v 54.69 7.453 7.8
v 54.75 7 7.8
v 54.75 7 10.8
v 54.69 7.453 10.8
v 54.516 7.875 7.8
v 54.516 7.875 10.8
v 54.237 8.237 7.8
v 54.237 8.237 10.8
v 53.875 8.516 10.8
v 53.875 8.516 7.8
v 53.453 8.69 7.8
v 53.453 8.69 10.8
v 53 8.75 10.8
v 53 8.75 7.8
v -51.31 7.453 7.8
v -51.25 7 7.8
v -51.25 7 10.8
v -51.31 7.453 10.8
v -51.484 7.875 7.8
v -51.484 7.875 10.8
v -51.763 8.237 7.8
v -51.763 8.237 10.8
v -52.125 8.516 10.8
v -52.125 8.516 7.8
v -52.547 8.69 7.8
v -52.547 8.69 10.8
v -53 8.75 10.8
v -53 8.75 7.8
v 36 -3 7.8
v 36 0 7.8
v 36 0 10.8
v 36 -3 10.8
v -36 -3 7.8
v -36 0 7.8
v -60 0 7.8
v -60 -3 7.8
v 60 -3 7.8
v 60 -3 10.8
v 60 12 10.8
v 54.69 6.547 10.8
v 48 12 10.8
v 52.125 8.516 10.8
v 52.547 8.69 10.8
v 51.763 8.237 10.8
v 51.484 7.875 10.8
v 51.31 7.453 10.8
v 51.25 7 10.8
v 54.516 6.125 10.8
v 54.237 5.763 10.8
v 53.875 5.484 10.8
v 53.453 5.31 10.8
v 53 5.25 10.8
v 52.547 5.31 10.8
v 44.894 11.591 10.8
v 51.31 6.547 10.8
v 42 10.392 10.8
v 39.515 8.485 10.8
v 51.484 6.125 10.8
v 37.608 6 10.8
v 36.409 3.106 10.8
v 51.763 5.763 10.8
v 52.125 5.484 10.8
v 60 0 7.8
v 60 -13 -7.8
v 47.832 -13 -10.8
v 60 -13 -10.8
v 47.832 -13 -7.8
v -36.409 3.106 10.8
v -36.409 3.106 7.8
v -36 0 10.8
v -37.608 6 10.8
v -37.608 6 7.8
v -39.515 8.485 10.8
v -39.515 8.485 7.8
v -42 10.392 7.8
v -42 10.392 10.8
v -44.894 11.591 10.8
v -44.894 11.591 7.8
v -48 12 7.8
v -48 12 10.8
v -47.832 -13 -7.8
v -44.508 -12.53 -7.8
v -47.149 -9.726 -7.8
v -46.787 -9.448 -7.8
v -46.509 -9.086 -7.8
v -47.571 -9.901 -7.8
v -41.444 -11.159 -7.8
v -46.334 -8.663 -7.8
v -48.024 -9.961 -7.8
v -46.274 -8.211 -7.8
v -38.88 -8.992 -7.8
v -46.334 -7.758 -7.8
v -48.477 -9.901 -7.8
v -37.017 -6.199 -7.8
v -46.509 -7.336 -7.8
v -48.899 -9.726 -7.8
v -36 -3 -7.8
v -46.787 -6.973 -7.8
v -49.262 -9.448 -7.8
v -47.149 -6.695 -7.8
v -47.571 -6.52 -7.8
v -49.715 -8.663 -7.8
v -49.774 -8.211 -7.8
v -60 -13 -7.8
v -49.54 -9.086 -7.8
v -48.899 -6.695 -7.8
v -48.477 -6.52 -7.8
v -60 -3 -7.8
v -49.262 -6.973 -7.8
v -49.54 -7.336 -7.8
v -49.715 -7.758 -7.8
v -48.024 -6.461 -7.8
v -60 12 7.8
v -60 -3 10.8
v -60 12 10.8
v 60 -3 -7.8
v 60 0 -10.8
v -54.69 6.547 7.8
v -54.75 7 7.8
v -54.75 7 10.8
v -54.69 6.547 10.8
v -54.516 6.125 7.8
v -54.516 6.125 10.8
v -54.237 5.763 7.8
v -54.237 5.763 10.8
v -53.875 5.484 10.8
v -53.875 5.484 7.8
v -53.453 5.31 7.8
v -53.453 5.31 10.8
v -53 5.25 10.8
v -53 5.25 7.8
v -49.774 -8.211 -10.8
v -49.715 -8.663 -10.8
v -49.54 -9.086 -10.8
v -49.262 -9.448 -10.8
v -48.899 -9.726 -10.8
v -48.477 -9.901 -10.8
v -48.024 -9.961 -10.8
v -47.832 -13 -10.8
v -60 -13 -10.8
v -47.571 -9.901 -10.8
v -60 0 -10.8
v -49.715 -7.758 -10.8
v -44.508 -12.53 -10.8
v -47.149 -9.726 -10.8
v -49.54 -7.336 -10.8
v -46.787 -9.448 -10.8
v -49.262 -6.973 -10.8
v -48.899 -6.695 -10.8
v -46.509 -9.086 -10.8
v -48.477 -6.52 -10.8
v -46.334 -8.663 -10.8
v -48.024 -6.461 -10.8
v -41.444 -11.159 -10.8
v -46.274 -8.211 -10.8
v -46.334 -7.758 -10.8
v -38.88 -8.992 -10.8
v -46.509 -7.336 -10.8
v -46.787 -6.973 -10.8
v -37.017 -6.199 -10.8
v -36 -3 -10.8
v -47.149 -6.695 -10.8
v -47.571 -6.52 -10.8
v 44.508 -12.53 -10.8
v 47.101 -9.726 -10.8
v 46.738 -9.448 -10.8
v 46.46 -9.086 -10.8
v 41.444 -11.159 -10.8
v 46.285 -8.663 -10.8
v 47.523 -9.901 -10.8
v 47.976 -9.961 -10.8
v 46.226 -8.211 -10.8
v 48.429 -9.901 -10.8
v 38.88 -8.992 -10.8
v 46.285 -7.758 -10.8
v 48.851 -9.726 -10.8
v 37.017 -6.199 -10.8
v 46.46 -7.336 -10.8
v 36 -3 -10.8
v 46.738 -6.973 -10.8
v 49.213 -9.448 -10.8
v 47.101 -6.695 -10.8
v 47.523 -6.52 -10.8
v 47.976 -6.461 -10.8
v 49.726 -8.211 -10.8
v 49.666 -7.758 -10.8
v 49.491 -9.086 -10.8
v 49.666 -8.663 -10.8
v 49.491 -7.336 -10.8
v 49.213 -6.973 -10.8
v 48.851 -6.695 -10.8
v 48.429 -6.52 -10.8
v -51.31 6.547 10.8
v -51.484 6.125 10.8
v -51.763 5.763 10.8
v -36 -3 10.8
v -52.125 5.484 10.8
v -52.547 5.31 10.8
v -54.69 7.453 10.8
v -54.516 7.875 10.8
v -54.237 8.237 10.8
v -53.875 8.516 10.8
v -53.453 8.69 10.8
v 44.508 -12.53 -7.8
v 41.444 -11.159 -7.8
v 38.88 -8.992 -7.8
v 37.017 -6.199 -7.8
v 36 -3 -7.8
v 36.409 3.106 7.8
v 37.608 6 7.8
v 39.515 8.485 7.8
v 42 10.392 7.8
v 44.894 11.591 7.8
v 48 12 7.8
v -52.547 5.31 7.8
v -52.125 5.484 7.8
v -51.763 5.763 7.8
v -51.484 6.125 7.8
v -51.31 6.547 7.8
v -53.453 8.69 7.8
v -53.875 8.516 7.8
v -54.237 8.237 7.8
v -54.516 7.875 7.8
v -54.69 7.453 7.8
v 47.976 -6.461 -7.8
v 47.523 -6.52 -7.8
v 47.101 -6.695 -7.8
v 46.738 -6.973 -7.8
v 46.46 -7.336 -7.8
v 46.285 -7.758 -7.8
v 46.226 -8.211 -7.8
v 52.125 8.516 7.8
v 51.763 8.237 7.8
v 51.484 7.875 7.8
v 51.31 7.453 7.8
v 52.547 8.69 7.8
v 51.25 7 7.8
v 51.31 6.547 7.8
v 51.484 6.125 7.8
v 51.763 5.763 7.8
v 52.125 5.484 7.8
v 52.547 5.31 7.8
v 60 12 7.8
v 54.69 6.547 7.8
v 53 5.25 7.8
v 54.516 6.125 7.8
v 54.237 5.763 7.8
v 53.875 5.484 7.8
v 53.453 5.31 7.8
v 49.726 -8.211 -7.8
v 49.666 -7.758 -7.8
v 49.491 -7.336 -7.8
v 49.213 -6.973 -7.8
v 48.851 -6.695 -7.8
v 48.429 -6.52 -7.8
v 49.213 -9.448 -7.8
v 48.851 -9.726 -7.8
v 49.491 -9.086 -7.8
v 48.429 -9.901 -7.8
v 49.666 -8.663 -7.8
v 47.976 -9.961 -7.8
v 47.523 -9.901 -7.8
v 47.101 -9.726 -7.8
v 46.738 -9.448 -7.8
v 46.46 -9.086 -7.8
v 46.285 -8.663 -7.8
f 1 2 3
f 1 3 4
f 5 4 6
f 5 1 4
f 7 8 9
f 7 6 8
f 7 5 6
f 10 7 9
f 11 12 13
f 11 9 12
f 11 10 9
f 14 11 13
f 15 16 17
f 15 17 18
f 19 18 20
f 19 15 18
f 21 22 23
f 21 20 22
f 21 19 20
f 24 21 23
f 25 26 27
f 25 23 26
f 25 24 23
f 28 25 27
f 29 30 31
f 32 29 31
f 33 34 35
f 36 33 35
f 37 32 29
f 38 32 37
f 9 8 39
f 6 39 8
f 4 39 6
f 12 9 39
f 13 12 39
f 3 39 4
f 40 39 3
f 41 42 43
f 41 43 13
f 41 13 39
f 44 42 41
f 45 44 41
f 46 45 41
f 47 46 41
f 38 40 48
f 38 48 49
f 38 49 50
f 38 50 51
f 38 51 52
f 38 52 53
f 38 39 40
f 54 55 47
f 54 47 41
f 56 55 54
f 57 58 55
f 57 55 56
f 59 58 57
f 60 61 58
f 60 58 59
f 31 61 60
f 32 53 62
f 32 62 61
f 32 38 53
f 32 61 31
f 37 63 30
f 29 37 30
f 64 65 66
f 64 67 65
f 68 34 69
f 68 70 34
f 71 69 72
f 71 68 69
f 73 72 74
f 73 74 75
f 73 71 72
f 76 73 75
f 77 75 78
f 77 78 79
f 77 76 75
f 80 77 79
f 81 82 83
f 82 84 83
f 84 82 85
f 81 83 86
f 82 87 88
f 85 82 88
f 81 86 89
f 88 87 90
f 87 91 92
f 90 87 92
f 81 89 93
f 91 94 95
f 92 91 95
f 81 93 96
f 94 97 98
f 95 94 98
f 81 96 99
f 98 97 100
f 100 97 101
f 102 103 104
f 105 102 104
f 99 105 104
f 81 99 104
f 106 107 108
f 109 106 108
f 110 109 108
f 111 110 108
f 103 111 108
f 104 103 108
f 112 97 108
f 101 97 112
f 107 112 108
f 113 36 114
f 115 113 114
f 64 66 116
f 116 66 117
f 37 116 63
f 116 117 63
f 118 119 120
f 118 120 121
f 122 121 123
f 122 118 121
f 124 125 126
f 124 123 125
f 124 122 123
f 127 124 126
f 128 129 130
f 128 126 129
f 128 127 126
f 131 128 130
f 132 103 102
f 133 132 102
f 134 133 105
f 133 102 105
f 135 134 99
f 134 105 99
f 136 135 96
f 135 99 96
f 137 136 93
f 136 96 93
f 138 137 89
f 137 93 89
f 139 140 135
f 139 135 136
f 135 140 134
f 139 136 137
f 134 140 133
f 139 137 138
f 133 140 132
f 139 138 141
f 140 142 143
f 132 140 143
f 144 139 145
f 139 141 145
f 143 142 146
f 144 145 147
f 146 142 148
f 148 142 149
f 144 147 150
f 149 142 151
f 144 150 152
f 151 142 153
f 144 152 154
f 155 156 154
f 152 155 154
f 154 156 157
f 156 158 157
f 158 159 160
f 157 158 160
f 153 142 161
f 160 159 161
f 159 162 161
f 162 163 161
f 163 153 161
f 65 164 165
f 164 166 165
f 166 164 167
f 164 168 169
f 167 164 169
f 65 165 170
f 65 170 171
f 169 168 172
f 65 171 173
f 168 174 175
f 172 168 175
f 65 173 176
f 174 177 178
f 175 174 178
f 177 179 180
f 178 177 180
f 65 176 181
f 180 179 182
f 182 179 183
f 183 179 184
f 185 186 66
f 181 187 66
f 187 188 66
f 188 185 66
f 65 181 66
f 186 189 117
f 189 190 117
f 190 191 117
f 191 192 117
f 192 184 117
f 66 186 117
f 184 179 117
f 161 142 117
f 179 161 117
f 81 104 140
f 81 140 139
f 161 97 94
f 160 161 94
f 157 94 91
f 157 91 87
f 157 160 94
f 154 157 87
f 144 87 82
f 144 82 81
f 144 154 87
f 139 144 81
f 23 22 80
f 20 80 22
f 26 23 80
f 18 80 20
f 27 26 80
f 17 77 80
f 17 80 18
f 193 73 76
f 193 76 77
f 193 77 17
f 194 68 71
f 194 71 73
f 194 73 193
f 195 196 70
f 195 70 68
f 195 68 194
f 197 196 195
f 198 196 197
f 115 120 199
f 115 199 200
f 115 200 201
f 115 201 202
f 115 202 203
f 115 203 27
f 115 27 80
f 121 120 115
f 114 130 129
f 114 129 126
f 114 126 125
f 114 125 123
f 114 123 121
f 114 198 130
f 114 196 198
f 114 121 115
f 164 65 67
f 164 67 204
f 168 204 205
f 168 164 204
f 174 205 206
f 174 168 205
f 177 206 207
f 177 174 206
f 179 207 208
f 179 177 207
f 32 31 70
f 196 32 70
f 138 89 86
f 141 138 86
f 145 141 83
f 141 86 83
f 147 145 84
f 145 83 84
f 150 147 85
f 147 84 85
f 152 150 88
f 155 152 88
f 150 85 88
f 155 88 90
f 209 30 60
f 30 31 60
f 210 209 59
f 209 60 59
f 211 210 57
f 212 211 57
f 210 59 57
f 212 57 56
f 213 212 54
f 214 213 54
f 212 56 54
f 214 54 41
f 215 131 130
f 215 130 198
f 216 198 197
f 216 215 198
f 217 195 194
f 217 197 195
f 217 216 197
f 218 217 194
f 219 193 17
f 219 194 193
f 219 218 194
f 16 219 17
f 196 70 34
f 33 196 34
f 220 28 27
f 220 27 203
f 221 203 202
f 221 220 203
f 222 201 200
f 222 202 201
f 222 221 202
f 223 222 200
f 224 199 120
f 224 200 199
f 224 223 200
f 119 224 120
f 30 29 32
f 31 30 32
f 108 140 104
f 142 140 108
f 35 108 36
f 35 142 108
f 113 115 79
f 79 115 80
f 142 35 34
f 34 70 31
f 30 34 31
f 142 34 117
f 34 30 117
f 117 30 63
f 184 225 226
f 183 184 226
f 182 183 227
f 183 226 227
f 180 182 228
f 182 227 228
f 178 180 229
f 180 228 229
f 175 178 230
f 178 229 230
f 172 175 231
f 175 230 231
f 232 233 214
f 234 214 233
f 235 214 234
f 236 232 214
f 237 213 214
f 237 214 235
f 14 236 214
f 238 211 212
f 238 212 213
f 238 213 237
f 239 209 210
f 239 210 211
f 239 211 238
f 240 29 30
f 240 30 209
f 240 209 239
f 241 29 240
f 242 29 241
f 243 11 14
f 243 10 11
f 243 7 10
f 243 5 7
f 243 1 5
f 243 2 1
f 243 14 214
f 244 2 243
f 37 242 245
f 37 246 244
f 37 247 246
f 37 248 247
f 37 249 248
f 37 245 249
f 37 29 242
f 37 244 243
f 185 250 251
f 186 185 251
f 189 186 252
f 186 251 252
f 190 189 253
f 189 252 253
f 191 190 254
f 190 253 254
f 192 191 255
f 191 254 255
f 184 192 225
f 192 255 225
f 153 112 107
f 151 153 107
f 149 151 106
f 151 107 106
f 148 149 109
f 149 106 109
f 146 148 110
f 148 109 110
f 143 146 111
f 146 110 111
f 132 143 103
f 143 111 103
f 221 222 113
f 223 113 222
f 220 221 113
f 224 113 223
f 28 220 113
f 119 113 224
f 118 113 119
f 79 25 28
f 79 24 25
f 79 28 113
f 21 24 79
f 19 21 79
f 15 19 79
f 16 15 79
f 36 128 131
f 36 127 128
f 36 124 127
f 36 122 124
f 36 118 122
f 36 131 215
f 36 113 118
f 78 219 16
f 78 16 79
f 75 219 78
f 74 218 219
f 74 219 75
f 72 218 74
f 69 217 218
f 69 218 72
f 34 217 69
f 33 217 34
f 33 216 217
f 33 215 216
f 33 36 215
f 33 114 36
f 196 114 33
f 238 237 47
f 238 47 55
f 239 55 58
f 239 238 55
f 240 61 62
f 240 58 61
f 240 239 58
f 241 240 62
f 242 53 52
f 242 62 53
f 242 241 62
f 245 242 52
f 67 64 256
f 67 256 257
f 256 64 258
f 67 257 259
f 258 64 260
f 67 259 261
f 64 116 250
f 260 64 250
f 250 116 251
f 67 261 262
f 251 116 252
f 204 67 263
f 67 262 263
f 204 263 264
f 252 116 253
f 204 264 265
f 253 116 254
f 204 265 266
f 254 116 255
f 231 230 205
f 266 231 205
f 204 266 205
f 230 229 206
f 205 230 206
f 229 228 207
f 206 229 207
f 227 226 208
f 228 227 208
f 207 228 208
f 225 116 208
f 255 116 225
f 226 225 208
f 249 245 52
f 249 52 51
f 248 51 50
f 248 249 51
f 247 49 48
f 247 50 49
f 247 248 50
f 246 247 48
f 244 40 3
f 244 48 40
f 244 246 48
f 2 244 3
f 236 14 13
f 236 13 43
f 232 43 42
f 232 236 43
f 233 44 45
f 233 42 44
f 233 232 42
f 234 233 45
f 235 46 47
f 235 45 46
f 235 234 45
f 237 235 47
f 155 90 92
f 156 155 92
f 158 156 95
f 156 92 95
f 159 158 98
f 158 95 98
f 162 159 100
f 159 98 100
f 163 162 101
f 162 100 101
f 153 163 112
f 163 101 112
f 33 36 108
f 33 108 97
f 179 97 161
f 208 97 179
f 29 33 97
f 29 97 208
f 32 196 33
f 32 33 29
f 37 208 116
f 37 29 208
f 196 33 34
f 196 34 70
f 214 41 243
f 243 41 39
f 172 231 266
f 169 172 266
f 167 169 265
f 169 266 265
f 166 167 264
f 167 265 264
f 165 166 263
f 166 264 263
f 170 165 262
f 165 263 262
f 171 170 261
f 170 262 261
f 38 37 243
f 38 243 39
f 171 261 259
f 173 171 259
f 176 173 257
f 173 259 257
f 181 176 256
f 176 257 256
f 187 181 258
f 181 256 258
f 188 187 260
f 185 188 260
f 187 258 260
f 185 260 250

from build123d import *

# Parameters (mm, degrees)
F1_DEPTH    = 3
F0_W        = 12
F0_H        = 3
F2_DEPTH    = 13
F3_T1_DEPTH = 62.160797831
F4_T1_DEPTH = 62.160797831
F5_DEPTH    = 15
F7_R        = 12
F7_2_R      = 12
F9_DEPTH    = 25
F11_DEPTH   = 25


# Not quite as in the source:
# - a fillet or chamfer that OpenCascade refuses, or shapes differently, is made with other operations: its cross-section is extruded or revolved along the edge and cut away or added


with BuildPart() as f1:
    # F0 (on Front) → F1 (new body)
    with BuildSketch(Plane.XZ):
        Polygon((-48, 7.8), (-60, 7.8), (-60, -7.8), (-48, -7.8), (-36, -7.8), (-36, -10.8), (36, -10.8), (36, -7.8), (48, -7.8), (60, -7.8), (60, 7.8), (48, 7.8), (36, 7.8), (36, 10.8), (-36, 10.8), (-36, 7.8), align=None)
    extrude(amount=F1_DEPTH)

    # F0 (on Front) → F2 (join)
    with BuildSketch(Plane.XZ):
        with Locations((-54, -9.3)):
            Rectangle(F0_W, F0_H)
        with Locations((54, -9.3)):
            Rectangle(F0_W, F0_H)
        with Locations((-42, -9.3)):
            Rectangle(F0_W, F0_H)
        with Locations((42, -9.3)):
            Rectangle(F0_W, F0_H)
    extrude(amount=F2_DEPTH)

    # F3: fillet of radius 12 on 1 edges, made by hand

    # F3_s2 → F3_t1 (cut)
    with BuildSketch(Plane.XY.offset(-40.3803989155)):
        with BuildLine():
            ThreePointArc((-36, -3), (-40.0861928738, -10.1651513899), (-47.8321595662, -13))
            Line((-47.8321595662, -13), (-36, -13))
            Line((-36, -13), (-36, -3))
        make_face()
    extrude(amount=F3_T1_DEPTH, mode=Mode.SUBTRACT)

    # F4: fillet of radius 12 on 1 edges, made by hand

    # F4_s2 → F4_t1 (cut)
    with BuildSketch(Plane.XY.offset(-40.3803989155)):
        with BuildLine():
            ThreePointArc((47.8321595662, -13), (40.0861928738, -10.1651513899), (36, -3))
            Line((36, -3), (36, -13))
            Line((36, -13), (47.8321595662, -13))
        make_face()
    extrude(amount=F4_T1_DEPTH, mode=Mode.SUBTRACT)


with BuildPart() as f5:
    # F0 (on Front) → F5 (new body)
    with BuildSketch(Plane.XZ):
        with Locations((-54, 9.3)):
            Rectangle(F0_W, F0_H)
        with Locations((-42, 9.3)):
            Rectangle(F0_W, F0_H)
    extrude(amount=-F5_DEPTH)


with BuildPart() as f5b:
    # F0 (on Front) → F5, piece 2 (new body)
    with BuildSketch(Plane.XZ):
        with Locations((42, 9.3)):
            Rectangle(F0_W, F0_H)
        with Locations((54, 9.3)):
            Rectangle(F0_W, F0_H)
    extrude(amount=-F5_DEPTH)


with BuildPart() as f5_1:
    # F6: moved
    add(f5.part.moved(Location((0, -3, 0))))

    # F7
    f7_edges = [f5_1.edges().sort_by_distance(p)[0] for p in [
        (-36, 12, 9.3),
    ]]
    fillet(f7_edges, radius=F7_R)


with BuildPart() as f5b_1:
    # F6: moved
    add(f5b.part.moved(Location((0, -3, 0))))

    # F7#2
    f7_2_edges = [f5b_1.edges().sort_by_distance(p)[0] for p in [
        (36, 12, 9.3),
    ]]
    fillet(f7_2_edges, radius=F7_2_R)


with BuildPart() as f9:
    # F8 (on Top) → F9 (new body)
    with BuildSketch(Plane.XY):
        with BuildLine():
            ThreePointArc((-53, 8.75), (-54.2374368671, 8.2374368671), (-54.75, 7))
            Line((-54.75, 7), (-53, 7))
            Line((-53, 7), (-53, 8.75))
        make_face()
        with BuildLine():
            Line((-53, 8.75), (-53, 7))
            Line((-53, 7), (-51.25, 7))
            ThreePointArc((-51.25, 7), (-51.7625631329, 8.2374368671), (-53, 8.75))
        make_face()
        with BuildLine():
            Line((-53, 7), (-53, 5.25))
            ThreePointArc((-53, 5.25), (-51.7625631329, 5.7625631329), (-51.25, 7))
            Line((-51.25, 7), (-53, 7))
        make_face()
        with BuildLine():
            ThreePointArc((-54.75, 7), (-54.2374368671, 5.7625631329), (-53, 5.25))
            Line((-53, 5.25), (-53, 7))
            Line((-53, 7), (-54.75, 7))
        make_face()
    extrude(amount=F9_DEPTH)


with BuildPart() as f9b:
    # F8 (on Top) → F9, piece 2 (new body)
    with BuildSketch(Plane.XY):
        with BuildLine():
            ThreePointArc((51.25, 7), (51.7625631329, 5.7625631329), (53, 5.25))
            Line((53, 5.25), (53, 7))
            Line((53, 7), (51.25, 7))
        make_face()
        with BuildLine():
            Line((53, 7), (53, 5.25))
            ThreePointArc((53, 5.25), (54.2374368671, 5.7625631329), (54.75, 7))
            Line((54.75, 7), (53, 7))
        make_face()
        with BuildLine():
            Line((53, 8.75), (53, 7))
            Line((53, 7), (54.75, 7))
            ThreePointArc((54.75, 7), (54.2374368671, 8.2374368671), (53, 8.75))
        make_face()
        with BuildLine():
            Line((51.25, 7), (53, 7))
            Line((53, 7), (53, 8.75))
            ThreePointArc((53, 8.75), (51.7625631329, 8.2374368671), (51.25, 7))
        make_face()
    extrude(amount=F9_DEPTH)


with BuildPart() as f5_2:
    add(f5_1.part)

    # F10: cut F9, F9b
    add(f9.part, mode=Mode.SUBTRACT)
    add(f9b.part, mode=Mode.SUBTRACT)


with BuildPart() as f5b_2:
    add(f5b_1.part)

    # F10: cut F9, F9b
    add(f9.part, mode=Mode.SUBTRACT)
    add(f9b.part, mode=Mode.SUBTRACT)


with BuildPart() as f11:
    # F8 (on Top) → F11 (new body)
    with BuildSketch(Plane.XY):
        with BuildLine():
            ThreePointArc((-46.274432838, -8.2105052471), (-46.7869959709, -6.97306838), (-48.024432838, -6.4605052471))
            Line((-48.024432838, -6.4605052471), (-48.024432838, -8.2105052471))
            Line((-48.024432838, -8.2105052471), (-46.274432838, -8.2105052471))
        make_face()
        with BuildLine():
            Line((-48.024432838, -8.2105052471), (-48.024432838, -6.4605052471))
            ThreePointArc((-48.024432838, -6.4605052471), (-49.261869705, -6.97306838), (-49.774432838, -8.2105052471))
            Line((-49.774432838, -8.2105052471), (-48.024432838, -8.2105052471))
        make_face()
        with BuildLine():
            Line((-48.024432838, -8.2105052471), (-49.774432838, -8.2105052471))
            ThreePointArc((-49.774432838, -8.2105052471), (-49.261869705, -9.4479421142), (-48.024432838, -9.9605052471))
            Line((-48.024432838, -9.9605052471), (-48.024432838, -8.2105052471))
        make_face()
        with BuildLine():
            Line((-46.274432838, -8.2105052471), (-48.024432838, -8.2105052471))
            Line((-48.024432838, -8.2105052471), (-48.024432838, -9.9605052471))
            ThreePointArc((-48.024432838, -9.9605052471), (-46.7869959709, -9.4479421142), (-46.274432838, -8.2105052471))
        make_face()
    extrude(amount=-F11_DEPTH)


with BuildPart() as f11b:
    # F8 (on Top) → F11, piece 2 (new body)
    with BuildSketch(Plane.XY):
        with BuildLine():
            ThreePointArc((49.725567162, -8.2105052471), (49.2130040291, -6.97306838), (47.975567162, -6.4605052471))
            Line((47.975567162, -6.4605052471), (47.975567162, -8.2105052471))
            Line((47.975567162, -8.2105052471), (49.725567162, -8.2105052471))
        make_face()
        with BuildLine():
            Line((47.975567162, -8.2105052471), (47.975567162, -6.4605052471))
            ThreePointArc((47.975567162, -6.4605052471), (46.738130295, -6.97306838), (46.225567162, -8.2105052471))
            Line((46.225567162, -8.2105052471), (47.975567162, -8.2105052471))
        make_face()
        with BuildLine():
            Line((47.975567162, -9.9605052471), (47.975567162, -8.2105052471))
            Line((47.975567162, -8.2105052471), (46.225567162, -8.2105052471))
            ThreePointArc((46.225567162, -8.2105052471), (46.738130295, -9.4479421142), (47.975567162, -9.9605052471))
        make_face()
        with BuildLine():
            Line((49.725567162, -8.2105052471), (47.975567162, -8.2105052471))
            Line((47.975567162, -8.2105052471), (47.975567162, -9.9605052471))
            ThreePointArc((47.975567162, -9.9605052471), (49.2130040291, -9.4479421142), (49.725567162, -8.2105052471))
        make_face()
    extrude(amount=-F11_DEPTH)


with BuildPart() as f1_1:
    add(f1.part)

    # F12: cut F11, F11b
    add(f11.part, mode=Mode.SUBTRACT)
    add(f11b.part, mode=Mode.SUBTRACT)


solid = Compound([f5_2.part, f5b_2.part, f1_1.part])
